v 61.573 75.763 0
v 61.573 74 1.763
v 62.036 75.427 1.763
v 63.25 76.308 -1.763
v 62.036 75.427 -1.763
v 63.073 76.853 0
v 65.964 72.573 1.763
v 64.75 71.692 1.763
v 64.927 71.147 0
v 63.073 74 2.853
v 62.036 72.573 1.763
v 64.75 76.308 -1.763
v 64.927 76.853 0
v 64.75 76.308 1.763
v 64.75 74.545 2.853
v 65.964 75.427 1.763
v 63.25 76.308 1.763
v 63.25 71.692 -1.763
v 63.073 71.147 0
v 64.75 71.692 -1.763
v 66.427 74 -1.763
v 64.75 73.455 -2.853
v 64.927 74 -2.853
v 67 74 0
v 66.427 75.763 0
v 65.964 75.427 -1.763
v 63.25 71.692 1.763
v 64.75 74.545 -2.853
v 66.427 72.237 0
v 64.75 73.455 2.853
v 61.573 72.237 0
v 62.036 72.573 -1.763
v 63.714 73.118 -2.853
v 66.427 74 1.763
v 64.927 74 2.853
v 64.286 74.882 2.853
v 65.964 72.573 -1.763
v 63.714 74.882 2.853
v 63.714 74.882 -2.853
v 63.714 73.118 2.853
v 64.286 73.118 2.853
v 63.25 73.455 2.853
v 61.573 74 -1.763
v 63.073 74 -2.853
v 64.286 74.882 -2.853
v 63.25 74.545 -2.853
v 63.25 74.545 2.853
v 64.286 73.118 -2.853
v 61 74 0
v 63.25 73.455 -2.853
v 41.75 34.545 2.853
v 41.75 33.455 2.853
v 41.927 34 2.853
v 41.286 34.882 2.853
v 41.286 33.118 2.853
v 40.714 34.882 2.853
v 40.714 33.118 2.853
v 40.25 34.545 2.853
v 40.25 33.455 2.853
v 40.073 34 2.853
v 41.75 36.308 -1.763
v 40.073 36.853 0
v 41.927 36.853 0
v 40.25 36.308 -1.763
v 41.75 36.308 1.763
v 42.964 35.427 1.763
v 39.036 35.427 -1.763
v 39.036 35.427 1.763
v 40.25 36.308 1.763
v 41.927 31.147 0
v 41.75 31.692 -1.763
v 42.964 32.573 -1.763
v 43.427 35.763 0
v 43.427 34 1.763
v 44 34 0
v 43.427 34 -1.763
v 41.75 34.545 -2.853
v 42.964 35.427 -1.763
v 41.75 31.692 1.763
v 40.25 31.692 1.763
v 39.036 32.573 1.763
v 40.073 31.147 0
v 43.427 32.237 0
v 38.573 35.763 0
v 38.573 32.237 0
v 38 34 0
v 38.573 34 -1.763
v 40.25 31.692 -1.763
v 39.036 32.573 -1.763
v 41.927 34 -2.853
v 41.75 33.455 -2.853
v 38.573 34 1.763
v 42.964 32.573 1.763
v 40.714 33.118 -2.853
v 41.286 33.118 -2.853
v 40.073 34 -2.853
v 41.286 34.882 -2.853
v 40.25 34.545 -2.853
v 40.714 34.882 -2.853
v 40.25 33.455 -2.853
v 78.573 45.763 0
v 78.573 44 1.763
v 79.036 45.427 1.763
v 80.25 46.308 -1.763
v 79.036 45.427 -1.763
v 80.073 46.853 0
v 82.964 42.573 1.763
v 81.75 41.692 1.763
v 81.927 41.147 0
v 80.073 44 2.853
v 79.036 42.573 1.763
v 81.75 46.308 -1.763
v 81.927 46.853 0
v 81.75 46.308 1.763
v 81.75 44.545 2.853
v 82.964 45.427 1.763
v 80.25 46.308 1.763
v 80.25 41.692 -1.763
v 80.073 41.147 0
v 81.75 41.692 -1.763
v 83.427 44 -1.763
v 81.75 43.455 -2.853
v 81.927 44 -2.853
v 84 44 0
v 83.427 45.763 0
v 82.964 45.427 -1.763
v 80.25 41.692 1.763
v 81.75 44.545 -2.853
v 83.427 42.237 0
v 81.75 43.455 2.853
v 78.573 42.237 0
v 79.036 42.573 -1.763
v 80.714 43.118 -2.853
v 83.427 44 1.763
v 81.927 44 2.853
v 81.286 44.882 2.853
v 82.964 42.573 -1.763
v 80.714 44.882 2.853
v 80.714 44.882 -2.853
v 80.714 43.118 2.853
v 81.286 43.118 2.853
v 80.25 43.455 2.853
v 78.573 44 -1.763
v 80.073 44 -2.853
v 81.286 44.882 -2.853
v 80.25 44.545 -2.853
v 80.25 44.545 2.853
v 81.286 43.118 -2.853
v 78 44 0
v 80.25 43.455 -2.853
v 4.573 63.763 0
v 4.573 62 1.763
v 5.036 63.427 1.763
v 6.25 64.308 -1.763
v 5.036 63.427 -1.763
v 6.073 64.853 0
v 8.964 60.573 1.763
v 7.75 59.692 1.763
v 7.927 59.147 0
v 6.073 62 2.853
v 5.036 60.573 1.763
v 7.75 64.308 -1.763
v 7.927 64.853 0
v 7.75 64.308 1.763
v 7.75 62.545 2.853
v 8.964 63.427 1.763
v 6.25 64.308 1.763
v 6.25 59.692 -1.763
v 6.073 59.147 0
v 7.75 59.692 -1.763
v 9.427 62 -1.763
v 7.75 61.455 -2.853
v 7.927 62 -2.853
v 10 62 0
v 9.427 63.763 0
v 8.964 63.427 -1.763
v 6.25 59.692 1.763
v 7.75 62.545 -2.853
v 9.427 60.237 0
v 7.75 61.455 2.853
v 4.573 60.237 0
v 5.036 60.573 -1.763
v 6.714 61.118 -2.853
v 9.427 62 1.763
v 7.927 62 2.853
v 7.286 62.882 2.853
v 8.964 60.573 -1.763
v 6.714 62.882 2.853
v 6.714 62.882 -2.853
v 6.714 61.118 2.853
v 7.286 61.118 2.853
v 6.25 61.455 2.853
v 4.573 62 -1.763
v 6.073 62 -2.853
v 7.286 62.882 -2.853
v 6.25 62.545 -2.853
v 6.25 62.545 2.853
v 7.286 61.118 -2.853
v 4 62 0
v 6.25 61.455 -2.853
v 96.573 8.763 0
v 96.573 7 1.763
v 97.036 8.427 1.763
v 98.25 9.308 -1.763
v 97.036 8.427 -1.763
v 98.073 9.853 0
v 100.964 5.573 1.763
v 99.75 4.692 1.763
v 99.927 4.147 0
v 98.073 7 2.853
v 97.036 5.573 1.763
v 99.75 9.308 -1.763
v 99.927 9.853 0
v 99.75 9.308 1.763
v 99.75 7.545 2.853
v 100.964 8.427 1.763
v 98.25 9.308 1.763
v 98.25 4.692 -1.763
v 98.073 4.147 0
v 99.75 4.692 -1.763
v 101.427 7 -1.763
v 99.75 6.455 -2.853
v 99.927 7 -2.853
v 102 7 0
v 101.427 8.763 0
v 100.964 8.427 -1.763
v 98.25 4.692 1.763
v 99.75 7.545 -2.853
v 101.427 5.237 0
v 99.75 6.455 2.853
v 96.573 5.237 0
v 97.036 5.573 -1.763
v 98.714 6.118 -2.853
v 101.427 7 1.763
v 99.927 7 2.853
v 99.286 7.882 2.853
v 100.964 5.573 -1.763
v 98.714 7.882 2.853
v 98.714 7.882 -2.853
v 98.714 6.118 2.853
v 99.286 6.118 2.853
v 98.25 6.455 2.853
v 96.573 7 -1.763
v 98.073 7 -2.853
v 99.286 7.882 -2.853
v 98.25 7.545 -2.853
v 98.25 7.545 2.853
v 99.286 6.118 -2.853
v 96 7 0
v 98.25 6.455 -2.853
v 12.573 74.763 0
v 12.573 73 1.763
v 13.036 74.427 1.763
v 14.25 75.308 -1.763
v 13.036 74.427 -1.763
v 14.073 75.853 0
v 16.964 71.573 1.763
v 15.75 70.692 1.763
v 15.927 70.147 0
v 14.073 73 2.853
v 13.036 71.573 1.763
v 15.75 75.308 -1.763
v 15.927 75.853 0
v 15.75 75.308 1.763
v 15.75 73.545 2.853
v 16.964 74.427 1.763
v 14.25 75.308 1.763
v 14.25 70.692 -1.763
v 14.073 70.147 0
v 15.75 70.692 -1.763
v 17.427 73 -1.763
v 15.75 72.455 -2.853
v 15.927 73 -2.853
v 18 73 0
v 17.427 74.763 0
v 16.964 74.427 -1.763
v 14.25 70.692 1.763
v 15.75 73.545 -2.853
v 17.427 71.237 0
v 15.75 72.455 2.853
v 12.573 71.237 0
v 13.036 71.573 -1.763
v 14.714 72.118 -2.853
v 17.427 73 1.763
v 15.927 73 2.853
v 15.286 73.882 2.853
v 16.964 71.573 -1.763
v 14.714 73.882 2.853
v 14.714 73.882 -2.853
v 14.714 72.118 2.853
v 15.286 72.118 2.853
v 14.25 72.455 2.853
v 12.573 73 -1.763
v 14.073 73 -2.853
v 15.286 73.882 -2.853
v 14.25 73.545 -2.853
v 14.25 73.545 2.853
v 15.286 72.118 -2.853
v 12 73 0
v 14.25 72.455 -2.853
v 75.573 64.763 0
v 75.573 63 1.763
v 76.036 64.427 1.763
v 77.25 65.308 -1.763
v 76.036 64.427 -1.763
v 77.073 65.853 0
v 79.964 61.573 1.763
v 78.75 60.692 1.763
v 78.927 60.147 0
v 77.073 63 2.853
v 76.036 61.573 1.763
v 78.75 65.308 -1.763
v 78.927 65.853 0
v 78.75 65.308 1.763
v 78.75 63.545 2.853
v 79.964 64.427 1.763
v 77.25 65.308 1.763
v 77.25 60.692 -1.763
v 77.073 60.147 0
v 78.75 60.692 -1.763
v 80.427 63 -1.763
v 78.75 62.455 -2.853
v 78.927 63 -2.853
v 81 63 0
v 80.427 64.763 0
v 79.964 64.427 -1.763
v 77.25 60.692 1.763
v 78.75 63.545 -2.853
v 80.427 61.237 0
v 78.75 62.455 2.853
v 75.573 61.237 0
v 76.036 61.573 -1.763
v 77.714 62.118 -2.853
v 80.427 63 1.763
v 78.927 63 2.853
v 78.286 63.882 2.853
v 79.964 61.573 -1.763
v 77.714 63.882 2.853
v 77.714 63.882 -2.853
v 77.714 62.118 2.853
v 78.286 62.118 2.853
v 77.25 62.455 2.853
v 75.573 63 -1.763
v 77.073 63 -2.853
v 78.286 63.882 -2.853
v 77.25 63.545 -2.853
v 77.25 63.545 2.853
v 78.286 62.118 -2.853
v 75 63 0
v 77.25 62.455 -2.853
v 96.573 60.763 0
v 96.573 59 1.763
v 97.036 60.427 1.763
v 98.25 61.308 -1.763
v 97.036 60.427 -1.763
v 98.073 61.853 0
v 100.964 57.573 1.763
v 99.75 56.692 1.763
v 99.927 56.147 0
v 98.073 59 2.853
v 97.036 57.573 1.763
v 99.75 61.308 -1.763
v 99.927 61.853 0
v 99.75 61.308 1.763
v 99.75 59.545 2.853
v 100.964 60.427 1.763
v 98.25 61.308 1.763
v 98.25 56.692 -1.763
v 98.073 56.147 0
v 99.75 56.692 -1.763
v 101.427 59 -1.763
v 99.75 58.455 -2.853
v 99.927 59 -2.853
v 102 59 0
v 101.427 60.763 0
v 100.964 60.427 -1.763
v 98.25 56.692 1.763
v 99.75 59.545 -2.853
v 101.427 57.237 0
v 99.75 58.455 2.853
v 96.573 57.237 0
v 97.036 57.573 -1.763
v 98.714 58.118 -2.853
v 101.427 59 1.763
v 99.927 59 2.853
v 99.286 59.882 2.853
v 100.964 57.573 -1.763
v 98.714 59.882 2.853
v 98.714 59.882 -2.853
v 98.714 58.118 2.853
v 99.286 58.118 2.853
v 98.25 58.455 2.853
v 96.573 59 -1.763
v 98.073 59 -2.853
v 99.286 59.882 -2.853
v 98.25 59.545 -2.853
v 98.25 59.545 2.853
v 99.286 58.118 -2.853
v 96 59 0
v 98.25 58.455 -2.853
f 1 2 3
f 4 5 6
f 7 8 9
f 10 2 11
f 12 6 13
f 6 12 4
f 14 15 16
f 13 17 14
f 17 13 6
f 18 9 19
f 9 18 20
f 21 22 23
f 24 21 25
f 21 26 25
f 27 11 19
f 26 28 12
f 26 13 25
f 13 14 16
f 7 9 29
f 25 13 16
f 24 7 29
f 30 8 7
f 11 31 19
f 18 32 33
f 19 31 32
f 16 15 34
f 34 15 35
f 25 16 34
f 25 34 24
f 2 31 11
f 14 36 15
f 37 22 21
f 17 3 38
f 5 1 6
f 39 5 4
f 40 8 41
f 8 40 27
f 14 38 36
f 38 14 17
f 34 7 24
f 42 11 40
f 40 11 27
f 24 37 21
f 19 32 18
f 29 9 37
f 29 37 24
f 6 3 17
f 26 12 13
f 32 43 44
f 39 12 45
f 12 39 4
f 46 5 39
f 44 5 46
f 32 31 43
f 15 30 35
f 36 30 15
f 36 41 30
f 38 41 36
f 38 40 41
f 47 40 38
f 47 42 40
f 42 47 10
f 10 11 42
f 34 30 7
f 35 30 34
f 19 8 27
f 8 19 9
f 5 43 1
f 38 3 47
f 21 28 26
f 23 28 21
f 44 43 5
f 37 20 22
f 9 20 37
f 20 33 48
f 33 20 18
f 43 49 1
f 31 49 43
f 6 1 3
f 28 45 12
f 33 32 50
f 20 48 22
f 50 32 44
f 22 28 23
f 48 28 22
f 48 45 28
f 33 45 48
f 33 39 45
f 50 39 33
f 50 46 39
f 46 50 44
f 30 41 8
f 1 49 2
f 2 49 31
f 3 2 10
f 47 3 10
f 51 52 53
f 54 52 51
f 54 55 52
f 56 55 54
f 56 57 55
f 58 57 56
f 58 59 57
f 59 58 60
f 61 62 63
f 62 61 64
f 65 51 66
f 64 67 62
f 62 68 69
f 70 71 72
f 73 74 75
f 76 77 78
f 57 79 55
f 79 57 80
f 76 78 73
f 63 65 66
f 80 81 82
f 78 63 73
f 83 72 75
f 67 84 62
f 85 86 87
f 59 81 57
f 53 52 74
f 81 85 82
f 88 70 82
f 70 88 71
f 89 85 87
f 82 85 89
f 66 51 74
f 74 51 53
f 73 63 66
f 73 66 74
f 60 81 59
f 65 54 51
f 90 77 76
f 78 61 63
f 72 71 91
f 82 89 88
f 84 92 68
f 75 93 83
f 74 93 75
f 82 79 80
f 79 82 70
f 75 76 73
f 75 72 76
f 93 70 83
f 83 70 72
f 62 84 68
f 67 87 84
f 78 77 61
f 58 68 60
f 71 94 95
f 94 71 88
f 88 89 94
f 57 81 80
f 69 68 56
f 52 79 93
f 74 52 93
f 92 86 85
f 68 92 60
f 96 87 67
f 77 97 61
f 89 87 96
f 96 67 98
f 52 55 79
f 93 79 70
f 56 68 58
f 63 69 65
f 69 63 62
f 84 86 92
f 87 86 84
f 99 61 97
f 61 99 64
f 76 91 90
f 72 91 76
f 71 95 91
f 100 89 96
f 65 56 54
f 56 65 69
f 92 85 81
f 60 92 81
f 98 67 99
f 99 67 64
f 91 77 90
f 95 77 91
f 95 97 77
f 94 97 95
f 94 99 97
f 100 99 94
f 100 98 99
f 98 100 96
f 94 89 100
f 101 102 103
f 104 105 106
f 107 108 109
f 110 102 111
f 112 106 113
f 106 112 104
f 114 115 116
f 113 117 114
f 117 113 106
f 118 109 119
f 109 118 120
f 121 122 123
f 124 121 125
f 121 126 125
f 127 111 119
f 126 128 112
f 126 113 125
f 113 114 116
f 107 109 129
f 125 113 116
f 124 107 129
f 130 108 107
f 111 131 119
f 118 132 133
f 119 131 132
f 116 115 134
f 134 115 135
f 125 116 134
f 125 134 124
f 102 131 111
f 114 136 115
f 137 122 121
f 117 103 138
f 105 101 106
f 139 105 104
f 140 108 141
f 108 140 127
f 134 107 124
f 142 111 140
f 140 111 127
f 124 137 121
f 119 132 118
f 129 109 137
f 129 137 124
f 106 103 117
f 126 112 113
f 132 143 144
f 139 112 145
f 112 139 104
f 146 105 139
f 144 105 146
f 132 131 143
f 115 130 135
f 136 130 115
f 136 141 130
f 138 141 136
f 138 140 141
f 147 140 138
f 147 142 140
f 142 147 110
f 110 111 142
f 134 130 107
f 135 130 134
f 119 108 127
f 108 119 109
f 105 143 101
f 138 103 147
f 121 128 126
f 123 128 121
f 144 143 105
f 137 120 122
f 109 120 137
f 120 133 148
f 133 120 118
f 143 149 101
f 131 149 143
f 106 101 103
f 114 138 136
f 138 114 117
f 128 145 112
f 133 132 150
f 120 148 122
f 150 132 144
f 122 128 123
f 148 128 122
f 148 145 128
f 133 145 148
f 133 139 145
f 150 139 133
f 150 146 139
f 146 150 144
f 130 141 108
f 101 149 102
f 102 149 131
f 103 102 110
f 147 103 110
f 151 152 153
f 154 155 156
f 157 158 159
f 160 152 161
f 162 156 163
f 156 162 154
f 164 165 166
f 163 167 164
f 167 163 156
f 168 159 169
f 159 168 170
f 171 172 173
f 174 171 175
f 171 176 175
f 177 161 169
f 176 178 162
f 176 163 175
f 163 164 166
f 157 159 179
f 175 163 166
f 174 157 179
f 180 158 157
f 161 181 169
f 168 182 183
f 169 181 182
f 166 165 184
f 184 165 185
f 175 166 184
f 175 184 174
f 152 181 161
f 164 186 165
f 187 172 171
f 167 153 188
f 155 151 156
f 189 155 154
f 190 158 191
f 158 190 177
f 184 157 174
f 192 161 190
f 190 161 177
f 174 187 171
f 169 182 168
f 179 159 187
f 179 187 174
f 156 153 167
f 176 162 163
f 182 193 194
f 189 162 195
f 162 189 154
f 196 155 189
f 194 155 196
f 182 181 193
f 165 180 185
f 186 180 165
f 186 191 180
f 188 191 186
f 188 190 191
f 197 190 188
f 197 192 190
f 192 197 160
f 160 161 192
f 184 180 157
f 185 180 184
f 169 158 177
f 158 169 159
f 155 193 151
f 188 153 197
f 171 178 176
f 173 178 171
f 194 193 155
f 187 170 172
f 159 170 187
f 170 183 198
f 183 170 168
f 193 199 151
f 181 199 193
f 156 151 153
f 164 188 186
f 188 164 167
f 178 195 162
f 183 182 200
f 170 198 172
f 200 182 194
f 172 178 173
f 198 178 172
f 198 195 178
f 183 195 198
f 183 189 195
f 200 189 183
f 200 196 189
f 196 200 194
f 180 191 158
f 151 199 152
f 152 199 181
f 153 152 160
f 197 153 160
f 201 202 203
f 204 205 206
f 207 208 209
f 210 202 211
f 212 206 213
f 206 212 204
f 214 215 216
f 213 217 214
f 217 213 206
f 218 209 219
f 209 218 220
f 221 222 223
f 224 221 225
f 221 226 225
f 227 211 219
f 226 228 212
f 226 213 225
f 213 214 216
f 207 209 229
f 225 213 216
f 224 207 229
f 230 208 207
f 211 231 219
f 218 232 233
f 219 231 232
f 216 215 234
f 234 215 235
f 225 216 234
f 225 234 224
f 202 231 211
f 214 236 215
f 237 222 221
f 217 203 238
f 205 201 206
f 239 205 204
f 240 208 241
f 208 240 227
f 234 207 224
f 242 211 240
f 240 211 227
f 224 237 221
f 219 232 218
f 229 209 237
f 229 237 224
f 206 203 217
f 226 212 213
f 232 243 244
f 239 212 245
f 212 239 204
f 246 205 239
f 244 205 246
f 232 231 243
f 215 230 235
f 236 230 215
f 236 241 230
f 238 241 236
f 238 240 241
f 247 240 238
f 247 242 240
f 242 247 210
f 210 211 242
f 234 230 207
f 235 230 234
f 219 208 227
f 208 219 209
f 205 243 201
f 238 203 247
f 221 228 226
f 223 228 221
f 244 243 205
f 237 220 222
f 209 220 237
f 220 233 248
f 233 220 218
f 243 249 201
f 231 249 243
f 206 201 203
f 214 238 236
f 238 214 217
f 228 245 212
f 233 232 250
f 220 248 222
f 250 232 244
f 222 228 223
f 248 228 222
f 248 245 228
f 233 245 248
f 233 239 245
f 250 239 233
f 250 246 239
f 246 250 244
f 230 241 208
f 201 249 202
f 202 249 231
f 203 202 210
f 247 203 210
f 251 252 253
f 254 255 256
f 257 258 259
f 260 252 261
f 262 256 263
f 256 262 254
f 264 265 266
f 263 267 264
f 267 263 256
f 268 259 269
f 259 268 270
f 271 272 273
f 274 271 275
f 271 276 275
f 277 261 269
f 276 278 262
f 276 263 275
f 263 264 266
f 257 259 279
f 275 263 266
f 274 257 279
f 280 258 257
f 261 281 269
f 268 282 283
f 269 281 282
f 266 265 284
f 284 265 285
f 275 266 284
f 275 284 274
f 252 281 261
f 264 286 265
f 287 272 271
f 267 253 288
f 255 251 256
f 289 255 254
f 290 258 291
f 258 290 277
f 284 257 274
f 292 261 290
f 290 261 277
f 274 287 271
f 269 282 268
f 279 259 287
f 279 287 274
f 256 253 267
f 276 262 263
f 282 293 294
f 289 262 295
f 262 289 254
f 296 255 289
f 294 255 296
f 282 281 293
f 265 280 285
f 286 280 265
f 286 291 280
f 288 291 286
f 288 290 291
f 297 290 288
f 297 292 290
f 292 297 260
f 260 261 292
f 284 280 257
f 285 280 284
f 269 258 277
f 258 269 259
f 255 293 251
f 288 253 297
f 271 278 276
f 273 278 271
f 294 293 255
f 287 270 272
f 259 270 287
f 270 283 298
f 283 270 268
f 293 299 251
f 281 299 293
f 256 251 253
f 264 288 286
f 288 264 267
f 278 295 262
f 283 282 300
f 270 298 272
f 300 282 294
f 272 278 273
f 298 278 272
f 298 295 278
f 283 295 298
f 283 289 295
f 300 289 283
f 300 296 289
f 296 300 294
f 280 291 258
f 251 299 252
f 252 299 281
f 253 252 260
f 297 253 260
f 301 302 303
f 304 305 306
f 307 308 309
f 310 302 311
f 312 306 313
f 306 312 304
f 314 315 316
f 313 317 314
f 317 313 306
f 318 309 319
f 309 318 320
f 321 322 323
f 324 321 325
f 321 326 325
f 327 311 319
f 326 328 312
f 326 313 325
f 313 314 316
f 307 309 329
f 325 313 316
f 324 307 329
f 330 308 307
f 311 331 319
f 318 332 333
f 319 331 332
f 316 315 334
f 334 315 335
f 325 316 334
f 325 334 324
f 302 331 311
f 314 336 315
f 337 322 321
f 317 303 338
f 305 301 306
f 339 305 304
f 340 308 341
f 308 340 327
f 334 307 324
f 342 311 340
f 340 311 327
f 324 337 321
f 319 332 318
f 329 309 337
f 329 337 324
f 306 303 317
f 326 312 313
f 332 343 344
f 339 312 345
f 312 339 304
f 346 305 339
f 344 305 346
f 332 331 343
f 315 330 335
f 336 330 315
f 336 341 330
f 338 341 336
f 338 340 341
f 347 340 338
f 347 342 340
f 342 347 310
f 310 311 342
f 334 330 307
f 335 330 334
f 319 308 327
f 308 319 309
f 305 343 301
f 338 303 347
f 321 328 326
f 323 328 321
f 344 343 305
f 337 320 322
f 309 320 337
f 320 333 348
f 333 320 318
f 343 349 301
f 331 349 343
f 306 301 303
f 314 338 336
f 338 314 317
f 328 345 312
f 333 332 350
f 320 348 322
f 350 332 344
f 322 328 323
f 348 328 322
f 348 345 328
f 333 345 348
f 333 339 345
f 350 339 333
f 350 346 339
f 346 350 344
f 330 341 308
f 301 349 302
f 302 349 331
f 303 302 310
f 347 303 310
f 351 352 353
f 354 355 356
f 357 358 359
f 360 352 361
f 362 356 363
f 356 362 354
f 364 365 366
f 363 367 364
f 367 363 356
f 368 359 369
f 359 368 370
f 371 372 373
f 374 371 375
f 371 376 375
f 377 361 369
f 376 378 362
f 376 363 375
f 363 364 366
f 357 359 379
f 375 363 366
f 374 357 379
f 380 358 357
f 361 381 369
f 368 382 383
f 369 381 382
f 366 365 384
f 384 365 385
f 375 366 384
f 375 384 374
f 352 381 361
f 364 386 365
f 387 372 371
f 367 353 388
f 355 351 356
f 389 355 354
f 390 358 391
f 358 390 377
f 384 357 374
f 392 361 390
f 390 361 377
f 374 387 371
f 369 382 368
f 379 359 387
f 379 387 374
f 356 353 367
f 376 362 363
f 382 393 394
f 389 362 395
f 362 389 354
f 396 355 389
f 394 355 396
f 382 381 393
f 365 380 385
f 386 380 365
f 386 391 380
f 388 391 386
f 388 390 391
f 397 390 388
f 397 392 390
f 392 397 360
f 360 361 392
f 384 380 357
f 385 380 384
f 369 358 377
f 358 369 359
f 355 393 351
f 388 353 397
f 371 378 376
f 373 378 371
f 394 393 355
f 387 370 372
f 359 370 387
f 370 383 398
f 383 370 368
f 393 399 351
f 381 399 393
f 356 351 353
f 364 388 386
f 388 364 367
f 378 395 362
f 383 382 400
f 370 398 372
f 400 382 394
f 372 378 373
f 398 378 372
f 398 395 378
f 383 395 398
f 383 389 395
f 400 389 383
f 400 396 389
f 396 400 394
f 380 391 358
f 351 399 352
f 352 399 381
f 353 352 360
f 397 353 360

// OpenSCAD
// brute_force 
/*
find the farthest point
*/



//random points---------------------------------
function rnd_v(init_value,end_value)=round(rands(init_value,end_value,1)[0]);

init_value=0;
end_value=100;
points_num=8;

points=[
for(i=[0:points_num-1]
    )
    [rnd_v(init_value,end_value),
     rnd_v(init_value,end_value)
    ]];
for(i=points)
    translate(i)
        sphere(3);
//----------------------------------------------


function hypo(x,y)=
     pow(pow(x,2)+pow(y,2),0.5);


function find_max_distance(points)=
     let(init=0)
     let(index=1)
     let(leng=len(points)-1)
     leng==0? points[init]:
     let(p1=points[init])
     let(p2=points[index])
     let(max_distance=hypo(p1.x-p2.x,p1.y-p2.y))
     let(max_distance_points=[p1,p2])
    
     
     find_max_distance_inner(max_distance,max_distance_points,init,index+1,leng);



function find_max_distance_inner(max_distance,max_distance_points,init,index,leng)=
     
     init>leng? max_distance_points:
     index>leng? 
     let(init_=init+1)
     let(index_=init_+1)
     find_max_distance_inner(max_distance,max_distance_points,init_,index_,leng):



     let(p1=points[init])
     let(p2=points[index])
     let(distance=hypo(p1.x-p2.x,p1.y-p2.y))
     max_distance<distance ?
     let(max_distance_points_=[p1,p2])
     let(max_distance_=distance)
     find_max_distance_inner(max_distance_,     max_distance_points_,init,index+1,leng):

     find_max_distance_inner(max_distance,max_distance_points,init,index+1,leng);     
     
        
    
two_points=find_max_distance(points);

echo(two_points);

for(i=two_points)
    translate(i)
        color("red")
           sphere(3);
